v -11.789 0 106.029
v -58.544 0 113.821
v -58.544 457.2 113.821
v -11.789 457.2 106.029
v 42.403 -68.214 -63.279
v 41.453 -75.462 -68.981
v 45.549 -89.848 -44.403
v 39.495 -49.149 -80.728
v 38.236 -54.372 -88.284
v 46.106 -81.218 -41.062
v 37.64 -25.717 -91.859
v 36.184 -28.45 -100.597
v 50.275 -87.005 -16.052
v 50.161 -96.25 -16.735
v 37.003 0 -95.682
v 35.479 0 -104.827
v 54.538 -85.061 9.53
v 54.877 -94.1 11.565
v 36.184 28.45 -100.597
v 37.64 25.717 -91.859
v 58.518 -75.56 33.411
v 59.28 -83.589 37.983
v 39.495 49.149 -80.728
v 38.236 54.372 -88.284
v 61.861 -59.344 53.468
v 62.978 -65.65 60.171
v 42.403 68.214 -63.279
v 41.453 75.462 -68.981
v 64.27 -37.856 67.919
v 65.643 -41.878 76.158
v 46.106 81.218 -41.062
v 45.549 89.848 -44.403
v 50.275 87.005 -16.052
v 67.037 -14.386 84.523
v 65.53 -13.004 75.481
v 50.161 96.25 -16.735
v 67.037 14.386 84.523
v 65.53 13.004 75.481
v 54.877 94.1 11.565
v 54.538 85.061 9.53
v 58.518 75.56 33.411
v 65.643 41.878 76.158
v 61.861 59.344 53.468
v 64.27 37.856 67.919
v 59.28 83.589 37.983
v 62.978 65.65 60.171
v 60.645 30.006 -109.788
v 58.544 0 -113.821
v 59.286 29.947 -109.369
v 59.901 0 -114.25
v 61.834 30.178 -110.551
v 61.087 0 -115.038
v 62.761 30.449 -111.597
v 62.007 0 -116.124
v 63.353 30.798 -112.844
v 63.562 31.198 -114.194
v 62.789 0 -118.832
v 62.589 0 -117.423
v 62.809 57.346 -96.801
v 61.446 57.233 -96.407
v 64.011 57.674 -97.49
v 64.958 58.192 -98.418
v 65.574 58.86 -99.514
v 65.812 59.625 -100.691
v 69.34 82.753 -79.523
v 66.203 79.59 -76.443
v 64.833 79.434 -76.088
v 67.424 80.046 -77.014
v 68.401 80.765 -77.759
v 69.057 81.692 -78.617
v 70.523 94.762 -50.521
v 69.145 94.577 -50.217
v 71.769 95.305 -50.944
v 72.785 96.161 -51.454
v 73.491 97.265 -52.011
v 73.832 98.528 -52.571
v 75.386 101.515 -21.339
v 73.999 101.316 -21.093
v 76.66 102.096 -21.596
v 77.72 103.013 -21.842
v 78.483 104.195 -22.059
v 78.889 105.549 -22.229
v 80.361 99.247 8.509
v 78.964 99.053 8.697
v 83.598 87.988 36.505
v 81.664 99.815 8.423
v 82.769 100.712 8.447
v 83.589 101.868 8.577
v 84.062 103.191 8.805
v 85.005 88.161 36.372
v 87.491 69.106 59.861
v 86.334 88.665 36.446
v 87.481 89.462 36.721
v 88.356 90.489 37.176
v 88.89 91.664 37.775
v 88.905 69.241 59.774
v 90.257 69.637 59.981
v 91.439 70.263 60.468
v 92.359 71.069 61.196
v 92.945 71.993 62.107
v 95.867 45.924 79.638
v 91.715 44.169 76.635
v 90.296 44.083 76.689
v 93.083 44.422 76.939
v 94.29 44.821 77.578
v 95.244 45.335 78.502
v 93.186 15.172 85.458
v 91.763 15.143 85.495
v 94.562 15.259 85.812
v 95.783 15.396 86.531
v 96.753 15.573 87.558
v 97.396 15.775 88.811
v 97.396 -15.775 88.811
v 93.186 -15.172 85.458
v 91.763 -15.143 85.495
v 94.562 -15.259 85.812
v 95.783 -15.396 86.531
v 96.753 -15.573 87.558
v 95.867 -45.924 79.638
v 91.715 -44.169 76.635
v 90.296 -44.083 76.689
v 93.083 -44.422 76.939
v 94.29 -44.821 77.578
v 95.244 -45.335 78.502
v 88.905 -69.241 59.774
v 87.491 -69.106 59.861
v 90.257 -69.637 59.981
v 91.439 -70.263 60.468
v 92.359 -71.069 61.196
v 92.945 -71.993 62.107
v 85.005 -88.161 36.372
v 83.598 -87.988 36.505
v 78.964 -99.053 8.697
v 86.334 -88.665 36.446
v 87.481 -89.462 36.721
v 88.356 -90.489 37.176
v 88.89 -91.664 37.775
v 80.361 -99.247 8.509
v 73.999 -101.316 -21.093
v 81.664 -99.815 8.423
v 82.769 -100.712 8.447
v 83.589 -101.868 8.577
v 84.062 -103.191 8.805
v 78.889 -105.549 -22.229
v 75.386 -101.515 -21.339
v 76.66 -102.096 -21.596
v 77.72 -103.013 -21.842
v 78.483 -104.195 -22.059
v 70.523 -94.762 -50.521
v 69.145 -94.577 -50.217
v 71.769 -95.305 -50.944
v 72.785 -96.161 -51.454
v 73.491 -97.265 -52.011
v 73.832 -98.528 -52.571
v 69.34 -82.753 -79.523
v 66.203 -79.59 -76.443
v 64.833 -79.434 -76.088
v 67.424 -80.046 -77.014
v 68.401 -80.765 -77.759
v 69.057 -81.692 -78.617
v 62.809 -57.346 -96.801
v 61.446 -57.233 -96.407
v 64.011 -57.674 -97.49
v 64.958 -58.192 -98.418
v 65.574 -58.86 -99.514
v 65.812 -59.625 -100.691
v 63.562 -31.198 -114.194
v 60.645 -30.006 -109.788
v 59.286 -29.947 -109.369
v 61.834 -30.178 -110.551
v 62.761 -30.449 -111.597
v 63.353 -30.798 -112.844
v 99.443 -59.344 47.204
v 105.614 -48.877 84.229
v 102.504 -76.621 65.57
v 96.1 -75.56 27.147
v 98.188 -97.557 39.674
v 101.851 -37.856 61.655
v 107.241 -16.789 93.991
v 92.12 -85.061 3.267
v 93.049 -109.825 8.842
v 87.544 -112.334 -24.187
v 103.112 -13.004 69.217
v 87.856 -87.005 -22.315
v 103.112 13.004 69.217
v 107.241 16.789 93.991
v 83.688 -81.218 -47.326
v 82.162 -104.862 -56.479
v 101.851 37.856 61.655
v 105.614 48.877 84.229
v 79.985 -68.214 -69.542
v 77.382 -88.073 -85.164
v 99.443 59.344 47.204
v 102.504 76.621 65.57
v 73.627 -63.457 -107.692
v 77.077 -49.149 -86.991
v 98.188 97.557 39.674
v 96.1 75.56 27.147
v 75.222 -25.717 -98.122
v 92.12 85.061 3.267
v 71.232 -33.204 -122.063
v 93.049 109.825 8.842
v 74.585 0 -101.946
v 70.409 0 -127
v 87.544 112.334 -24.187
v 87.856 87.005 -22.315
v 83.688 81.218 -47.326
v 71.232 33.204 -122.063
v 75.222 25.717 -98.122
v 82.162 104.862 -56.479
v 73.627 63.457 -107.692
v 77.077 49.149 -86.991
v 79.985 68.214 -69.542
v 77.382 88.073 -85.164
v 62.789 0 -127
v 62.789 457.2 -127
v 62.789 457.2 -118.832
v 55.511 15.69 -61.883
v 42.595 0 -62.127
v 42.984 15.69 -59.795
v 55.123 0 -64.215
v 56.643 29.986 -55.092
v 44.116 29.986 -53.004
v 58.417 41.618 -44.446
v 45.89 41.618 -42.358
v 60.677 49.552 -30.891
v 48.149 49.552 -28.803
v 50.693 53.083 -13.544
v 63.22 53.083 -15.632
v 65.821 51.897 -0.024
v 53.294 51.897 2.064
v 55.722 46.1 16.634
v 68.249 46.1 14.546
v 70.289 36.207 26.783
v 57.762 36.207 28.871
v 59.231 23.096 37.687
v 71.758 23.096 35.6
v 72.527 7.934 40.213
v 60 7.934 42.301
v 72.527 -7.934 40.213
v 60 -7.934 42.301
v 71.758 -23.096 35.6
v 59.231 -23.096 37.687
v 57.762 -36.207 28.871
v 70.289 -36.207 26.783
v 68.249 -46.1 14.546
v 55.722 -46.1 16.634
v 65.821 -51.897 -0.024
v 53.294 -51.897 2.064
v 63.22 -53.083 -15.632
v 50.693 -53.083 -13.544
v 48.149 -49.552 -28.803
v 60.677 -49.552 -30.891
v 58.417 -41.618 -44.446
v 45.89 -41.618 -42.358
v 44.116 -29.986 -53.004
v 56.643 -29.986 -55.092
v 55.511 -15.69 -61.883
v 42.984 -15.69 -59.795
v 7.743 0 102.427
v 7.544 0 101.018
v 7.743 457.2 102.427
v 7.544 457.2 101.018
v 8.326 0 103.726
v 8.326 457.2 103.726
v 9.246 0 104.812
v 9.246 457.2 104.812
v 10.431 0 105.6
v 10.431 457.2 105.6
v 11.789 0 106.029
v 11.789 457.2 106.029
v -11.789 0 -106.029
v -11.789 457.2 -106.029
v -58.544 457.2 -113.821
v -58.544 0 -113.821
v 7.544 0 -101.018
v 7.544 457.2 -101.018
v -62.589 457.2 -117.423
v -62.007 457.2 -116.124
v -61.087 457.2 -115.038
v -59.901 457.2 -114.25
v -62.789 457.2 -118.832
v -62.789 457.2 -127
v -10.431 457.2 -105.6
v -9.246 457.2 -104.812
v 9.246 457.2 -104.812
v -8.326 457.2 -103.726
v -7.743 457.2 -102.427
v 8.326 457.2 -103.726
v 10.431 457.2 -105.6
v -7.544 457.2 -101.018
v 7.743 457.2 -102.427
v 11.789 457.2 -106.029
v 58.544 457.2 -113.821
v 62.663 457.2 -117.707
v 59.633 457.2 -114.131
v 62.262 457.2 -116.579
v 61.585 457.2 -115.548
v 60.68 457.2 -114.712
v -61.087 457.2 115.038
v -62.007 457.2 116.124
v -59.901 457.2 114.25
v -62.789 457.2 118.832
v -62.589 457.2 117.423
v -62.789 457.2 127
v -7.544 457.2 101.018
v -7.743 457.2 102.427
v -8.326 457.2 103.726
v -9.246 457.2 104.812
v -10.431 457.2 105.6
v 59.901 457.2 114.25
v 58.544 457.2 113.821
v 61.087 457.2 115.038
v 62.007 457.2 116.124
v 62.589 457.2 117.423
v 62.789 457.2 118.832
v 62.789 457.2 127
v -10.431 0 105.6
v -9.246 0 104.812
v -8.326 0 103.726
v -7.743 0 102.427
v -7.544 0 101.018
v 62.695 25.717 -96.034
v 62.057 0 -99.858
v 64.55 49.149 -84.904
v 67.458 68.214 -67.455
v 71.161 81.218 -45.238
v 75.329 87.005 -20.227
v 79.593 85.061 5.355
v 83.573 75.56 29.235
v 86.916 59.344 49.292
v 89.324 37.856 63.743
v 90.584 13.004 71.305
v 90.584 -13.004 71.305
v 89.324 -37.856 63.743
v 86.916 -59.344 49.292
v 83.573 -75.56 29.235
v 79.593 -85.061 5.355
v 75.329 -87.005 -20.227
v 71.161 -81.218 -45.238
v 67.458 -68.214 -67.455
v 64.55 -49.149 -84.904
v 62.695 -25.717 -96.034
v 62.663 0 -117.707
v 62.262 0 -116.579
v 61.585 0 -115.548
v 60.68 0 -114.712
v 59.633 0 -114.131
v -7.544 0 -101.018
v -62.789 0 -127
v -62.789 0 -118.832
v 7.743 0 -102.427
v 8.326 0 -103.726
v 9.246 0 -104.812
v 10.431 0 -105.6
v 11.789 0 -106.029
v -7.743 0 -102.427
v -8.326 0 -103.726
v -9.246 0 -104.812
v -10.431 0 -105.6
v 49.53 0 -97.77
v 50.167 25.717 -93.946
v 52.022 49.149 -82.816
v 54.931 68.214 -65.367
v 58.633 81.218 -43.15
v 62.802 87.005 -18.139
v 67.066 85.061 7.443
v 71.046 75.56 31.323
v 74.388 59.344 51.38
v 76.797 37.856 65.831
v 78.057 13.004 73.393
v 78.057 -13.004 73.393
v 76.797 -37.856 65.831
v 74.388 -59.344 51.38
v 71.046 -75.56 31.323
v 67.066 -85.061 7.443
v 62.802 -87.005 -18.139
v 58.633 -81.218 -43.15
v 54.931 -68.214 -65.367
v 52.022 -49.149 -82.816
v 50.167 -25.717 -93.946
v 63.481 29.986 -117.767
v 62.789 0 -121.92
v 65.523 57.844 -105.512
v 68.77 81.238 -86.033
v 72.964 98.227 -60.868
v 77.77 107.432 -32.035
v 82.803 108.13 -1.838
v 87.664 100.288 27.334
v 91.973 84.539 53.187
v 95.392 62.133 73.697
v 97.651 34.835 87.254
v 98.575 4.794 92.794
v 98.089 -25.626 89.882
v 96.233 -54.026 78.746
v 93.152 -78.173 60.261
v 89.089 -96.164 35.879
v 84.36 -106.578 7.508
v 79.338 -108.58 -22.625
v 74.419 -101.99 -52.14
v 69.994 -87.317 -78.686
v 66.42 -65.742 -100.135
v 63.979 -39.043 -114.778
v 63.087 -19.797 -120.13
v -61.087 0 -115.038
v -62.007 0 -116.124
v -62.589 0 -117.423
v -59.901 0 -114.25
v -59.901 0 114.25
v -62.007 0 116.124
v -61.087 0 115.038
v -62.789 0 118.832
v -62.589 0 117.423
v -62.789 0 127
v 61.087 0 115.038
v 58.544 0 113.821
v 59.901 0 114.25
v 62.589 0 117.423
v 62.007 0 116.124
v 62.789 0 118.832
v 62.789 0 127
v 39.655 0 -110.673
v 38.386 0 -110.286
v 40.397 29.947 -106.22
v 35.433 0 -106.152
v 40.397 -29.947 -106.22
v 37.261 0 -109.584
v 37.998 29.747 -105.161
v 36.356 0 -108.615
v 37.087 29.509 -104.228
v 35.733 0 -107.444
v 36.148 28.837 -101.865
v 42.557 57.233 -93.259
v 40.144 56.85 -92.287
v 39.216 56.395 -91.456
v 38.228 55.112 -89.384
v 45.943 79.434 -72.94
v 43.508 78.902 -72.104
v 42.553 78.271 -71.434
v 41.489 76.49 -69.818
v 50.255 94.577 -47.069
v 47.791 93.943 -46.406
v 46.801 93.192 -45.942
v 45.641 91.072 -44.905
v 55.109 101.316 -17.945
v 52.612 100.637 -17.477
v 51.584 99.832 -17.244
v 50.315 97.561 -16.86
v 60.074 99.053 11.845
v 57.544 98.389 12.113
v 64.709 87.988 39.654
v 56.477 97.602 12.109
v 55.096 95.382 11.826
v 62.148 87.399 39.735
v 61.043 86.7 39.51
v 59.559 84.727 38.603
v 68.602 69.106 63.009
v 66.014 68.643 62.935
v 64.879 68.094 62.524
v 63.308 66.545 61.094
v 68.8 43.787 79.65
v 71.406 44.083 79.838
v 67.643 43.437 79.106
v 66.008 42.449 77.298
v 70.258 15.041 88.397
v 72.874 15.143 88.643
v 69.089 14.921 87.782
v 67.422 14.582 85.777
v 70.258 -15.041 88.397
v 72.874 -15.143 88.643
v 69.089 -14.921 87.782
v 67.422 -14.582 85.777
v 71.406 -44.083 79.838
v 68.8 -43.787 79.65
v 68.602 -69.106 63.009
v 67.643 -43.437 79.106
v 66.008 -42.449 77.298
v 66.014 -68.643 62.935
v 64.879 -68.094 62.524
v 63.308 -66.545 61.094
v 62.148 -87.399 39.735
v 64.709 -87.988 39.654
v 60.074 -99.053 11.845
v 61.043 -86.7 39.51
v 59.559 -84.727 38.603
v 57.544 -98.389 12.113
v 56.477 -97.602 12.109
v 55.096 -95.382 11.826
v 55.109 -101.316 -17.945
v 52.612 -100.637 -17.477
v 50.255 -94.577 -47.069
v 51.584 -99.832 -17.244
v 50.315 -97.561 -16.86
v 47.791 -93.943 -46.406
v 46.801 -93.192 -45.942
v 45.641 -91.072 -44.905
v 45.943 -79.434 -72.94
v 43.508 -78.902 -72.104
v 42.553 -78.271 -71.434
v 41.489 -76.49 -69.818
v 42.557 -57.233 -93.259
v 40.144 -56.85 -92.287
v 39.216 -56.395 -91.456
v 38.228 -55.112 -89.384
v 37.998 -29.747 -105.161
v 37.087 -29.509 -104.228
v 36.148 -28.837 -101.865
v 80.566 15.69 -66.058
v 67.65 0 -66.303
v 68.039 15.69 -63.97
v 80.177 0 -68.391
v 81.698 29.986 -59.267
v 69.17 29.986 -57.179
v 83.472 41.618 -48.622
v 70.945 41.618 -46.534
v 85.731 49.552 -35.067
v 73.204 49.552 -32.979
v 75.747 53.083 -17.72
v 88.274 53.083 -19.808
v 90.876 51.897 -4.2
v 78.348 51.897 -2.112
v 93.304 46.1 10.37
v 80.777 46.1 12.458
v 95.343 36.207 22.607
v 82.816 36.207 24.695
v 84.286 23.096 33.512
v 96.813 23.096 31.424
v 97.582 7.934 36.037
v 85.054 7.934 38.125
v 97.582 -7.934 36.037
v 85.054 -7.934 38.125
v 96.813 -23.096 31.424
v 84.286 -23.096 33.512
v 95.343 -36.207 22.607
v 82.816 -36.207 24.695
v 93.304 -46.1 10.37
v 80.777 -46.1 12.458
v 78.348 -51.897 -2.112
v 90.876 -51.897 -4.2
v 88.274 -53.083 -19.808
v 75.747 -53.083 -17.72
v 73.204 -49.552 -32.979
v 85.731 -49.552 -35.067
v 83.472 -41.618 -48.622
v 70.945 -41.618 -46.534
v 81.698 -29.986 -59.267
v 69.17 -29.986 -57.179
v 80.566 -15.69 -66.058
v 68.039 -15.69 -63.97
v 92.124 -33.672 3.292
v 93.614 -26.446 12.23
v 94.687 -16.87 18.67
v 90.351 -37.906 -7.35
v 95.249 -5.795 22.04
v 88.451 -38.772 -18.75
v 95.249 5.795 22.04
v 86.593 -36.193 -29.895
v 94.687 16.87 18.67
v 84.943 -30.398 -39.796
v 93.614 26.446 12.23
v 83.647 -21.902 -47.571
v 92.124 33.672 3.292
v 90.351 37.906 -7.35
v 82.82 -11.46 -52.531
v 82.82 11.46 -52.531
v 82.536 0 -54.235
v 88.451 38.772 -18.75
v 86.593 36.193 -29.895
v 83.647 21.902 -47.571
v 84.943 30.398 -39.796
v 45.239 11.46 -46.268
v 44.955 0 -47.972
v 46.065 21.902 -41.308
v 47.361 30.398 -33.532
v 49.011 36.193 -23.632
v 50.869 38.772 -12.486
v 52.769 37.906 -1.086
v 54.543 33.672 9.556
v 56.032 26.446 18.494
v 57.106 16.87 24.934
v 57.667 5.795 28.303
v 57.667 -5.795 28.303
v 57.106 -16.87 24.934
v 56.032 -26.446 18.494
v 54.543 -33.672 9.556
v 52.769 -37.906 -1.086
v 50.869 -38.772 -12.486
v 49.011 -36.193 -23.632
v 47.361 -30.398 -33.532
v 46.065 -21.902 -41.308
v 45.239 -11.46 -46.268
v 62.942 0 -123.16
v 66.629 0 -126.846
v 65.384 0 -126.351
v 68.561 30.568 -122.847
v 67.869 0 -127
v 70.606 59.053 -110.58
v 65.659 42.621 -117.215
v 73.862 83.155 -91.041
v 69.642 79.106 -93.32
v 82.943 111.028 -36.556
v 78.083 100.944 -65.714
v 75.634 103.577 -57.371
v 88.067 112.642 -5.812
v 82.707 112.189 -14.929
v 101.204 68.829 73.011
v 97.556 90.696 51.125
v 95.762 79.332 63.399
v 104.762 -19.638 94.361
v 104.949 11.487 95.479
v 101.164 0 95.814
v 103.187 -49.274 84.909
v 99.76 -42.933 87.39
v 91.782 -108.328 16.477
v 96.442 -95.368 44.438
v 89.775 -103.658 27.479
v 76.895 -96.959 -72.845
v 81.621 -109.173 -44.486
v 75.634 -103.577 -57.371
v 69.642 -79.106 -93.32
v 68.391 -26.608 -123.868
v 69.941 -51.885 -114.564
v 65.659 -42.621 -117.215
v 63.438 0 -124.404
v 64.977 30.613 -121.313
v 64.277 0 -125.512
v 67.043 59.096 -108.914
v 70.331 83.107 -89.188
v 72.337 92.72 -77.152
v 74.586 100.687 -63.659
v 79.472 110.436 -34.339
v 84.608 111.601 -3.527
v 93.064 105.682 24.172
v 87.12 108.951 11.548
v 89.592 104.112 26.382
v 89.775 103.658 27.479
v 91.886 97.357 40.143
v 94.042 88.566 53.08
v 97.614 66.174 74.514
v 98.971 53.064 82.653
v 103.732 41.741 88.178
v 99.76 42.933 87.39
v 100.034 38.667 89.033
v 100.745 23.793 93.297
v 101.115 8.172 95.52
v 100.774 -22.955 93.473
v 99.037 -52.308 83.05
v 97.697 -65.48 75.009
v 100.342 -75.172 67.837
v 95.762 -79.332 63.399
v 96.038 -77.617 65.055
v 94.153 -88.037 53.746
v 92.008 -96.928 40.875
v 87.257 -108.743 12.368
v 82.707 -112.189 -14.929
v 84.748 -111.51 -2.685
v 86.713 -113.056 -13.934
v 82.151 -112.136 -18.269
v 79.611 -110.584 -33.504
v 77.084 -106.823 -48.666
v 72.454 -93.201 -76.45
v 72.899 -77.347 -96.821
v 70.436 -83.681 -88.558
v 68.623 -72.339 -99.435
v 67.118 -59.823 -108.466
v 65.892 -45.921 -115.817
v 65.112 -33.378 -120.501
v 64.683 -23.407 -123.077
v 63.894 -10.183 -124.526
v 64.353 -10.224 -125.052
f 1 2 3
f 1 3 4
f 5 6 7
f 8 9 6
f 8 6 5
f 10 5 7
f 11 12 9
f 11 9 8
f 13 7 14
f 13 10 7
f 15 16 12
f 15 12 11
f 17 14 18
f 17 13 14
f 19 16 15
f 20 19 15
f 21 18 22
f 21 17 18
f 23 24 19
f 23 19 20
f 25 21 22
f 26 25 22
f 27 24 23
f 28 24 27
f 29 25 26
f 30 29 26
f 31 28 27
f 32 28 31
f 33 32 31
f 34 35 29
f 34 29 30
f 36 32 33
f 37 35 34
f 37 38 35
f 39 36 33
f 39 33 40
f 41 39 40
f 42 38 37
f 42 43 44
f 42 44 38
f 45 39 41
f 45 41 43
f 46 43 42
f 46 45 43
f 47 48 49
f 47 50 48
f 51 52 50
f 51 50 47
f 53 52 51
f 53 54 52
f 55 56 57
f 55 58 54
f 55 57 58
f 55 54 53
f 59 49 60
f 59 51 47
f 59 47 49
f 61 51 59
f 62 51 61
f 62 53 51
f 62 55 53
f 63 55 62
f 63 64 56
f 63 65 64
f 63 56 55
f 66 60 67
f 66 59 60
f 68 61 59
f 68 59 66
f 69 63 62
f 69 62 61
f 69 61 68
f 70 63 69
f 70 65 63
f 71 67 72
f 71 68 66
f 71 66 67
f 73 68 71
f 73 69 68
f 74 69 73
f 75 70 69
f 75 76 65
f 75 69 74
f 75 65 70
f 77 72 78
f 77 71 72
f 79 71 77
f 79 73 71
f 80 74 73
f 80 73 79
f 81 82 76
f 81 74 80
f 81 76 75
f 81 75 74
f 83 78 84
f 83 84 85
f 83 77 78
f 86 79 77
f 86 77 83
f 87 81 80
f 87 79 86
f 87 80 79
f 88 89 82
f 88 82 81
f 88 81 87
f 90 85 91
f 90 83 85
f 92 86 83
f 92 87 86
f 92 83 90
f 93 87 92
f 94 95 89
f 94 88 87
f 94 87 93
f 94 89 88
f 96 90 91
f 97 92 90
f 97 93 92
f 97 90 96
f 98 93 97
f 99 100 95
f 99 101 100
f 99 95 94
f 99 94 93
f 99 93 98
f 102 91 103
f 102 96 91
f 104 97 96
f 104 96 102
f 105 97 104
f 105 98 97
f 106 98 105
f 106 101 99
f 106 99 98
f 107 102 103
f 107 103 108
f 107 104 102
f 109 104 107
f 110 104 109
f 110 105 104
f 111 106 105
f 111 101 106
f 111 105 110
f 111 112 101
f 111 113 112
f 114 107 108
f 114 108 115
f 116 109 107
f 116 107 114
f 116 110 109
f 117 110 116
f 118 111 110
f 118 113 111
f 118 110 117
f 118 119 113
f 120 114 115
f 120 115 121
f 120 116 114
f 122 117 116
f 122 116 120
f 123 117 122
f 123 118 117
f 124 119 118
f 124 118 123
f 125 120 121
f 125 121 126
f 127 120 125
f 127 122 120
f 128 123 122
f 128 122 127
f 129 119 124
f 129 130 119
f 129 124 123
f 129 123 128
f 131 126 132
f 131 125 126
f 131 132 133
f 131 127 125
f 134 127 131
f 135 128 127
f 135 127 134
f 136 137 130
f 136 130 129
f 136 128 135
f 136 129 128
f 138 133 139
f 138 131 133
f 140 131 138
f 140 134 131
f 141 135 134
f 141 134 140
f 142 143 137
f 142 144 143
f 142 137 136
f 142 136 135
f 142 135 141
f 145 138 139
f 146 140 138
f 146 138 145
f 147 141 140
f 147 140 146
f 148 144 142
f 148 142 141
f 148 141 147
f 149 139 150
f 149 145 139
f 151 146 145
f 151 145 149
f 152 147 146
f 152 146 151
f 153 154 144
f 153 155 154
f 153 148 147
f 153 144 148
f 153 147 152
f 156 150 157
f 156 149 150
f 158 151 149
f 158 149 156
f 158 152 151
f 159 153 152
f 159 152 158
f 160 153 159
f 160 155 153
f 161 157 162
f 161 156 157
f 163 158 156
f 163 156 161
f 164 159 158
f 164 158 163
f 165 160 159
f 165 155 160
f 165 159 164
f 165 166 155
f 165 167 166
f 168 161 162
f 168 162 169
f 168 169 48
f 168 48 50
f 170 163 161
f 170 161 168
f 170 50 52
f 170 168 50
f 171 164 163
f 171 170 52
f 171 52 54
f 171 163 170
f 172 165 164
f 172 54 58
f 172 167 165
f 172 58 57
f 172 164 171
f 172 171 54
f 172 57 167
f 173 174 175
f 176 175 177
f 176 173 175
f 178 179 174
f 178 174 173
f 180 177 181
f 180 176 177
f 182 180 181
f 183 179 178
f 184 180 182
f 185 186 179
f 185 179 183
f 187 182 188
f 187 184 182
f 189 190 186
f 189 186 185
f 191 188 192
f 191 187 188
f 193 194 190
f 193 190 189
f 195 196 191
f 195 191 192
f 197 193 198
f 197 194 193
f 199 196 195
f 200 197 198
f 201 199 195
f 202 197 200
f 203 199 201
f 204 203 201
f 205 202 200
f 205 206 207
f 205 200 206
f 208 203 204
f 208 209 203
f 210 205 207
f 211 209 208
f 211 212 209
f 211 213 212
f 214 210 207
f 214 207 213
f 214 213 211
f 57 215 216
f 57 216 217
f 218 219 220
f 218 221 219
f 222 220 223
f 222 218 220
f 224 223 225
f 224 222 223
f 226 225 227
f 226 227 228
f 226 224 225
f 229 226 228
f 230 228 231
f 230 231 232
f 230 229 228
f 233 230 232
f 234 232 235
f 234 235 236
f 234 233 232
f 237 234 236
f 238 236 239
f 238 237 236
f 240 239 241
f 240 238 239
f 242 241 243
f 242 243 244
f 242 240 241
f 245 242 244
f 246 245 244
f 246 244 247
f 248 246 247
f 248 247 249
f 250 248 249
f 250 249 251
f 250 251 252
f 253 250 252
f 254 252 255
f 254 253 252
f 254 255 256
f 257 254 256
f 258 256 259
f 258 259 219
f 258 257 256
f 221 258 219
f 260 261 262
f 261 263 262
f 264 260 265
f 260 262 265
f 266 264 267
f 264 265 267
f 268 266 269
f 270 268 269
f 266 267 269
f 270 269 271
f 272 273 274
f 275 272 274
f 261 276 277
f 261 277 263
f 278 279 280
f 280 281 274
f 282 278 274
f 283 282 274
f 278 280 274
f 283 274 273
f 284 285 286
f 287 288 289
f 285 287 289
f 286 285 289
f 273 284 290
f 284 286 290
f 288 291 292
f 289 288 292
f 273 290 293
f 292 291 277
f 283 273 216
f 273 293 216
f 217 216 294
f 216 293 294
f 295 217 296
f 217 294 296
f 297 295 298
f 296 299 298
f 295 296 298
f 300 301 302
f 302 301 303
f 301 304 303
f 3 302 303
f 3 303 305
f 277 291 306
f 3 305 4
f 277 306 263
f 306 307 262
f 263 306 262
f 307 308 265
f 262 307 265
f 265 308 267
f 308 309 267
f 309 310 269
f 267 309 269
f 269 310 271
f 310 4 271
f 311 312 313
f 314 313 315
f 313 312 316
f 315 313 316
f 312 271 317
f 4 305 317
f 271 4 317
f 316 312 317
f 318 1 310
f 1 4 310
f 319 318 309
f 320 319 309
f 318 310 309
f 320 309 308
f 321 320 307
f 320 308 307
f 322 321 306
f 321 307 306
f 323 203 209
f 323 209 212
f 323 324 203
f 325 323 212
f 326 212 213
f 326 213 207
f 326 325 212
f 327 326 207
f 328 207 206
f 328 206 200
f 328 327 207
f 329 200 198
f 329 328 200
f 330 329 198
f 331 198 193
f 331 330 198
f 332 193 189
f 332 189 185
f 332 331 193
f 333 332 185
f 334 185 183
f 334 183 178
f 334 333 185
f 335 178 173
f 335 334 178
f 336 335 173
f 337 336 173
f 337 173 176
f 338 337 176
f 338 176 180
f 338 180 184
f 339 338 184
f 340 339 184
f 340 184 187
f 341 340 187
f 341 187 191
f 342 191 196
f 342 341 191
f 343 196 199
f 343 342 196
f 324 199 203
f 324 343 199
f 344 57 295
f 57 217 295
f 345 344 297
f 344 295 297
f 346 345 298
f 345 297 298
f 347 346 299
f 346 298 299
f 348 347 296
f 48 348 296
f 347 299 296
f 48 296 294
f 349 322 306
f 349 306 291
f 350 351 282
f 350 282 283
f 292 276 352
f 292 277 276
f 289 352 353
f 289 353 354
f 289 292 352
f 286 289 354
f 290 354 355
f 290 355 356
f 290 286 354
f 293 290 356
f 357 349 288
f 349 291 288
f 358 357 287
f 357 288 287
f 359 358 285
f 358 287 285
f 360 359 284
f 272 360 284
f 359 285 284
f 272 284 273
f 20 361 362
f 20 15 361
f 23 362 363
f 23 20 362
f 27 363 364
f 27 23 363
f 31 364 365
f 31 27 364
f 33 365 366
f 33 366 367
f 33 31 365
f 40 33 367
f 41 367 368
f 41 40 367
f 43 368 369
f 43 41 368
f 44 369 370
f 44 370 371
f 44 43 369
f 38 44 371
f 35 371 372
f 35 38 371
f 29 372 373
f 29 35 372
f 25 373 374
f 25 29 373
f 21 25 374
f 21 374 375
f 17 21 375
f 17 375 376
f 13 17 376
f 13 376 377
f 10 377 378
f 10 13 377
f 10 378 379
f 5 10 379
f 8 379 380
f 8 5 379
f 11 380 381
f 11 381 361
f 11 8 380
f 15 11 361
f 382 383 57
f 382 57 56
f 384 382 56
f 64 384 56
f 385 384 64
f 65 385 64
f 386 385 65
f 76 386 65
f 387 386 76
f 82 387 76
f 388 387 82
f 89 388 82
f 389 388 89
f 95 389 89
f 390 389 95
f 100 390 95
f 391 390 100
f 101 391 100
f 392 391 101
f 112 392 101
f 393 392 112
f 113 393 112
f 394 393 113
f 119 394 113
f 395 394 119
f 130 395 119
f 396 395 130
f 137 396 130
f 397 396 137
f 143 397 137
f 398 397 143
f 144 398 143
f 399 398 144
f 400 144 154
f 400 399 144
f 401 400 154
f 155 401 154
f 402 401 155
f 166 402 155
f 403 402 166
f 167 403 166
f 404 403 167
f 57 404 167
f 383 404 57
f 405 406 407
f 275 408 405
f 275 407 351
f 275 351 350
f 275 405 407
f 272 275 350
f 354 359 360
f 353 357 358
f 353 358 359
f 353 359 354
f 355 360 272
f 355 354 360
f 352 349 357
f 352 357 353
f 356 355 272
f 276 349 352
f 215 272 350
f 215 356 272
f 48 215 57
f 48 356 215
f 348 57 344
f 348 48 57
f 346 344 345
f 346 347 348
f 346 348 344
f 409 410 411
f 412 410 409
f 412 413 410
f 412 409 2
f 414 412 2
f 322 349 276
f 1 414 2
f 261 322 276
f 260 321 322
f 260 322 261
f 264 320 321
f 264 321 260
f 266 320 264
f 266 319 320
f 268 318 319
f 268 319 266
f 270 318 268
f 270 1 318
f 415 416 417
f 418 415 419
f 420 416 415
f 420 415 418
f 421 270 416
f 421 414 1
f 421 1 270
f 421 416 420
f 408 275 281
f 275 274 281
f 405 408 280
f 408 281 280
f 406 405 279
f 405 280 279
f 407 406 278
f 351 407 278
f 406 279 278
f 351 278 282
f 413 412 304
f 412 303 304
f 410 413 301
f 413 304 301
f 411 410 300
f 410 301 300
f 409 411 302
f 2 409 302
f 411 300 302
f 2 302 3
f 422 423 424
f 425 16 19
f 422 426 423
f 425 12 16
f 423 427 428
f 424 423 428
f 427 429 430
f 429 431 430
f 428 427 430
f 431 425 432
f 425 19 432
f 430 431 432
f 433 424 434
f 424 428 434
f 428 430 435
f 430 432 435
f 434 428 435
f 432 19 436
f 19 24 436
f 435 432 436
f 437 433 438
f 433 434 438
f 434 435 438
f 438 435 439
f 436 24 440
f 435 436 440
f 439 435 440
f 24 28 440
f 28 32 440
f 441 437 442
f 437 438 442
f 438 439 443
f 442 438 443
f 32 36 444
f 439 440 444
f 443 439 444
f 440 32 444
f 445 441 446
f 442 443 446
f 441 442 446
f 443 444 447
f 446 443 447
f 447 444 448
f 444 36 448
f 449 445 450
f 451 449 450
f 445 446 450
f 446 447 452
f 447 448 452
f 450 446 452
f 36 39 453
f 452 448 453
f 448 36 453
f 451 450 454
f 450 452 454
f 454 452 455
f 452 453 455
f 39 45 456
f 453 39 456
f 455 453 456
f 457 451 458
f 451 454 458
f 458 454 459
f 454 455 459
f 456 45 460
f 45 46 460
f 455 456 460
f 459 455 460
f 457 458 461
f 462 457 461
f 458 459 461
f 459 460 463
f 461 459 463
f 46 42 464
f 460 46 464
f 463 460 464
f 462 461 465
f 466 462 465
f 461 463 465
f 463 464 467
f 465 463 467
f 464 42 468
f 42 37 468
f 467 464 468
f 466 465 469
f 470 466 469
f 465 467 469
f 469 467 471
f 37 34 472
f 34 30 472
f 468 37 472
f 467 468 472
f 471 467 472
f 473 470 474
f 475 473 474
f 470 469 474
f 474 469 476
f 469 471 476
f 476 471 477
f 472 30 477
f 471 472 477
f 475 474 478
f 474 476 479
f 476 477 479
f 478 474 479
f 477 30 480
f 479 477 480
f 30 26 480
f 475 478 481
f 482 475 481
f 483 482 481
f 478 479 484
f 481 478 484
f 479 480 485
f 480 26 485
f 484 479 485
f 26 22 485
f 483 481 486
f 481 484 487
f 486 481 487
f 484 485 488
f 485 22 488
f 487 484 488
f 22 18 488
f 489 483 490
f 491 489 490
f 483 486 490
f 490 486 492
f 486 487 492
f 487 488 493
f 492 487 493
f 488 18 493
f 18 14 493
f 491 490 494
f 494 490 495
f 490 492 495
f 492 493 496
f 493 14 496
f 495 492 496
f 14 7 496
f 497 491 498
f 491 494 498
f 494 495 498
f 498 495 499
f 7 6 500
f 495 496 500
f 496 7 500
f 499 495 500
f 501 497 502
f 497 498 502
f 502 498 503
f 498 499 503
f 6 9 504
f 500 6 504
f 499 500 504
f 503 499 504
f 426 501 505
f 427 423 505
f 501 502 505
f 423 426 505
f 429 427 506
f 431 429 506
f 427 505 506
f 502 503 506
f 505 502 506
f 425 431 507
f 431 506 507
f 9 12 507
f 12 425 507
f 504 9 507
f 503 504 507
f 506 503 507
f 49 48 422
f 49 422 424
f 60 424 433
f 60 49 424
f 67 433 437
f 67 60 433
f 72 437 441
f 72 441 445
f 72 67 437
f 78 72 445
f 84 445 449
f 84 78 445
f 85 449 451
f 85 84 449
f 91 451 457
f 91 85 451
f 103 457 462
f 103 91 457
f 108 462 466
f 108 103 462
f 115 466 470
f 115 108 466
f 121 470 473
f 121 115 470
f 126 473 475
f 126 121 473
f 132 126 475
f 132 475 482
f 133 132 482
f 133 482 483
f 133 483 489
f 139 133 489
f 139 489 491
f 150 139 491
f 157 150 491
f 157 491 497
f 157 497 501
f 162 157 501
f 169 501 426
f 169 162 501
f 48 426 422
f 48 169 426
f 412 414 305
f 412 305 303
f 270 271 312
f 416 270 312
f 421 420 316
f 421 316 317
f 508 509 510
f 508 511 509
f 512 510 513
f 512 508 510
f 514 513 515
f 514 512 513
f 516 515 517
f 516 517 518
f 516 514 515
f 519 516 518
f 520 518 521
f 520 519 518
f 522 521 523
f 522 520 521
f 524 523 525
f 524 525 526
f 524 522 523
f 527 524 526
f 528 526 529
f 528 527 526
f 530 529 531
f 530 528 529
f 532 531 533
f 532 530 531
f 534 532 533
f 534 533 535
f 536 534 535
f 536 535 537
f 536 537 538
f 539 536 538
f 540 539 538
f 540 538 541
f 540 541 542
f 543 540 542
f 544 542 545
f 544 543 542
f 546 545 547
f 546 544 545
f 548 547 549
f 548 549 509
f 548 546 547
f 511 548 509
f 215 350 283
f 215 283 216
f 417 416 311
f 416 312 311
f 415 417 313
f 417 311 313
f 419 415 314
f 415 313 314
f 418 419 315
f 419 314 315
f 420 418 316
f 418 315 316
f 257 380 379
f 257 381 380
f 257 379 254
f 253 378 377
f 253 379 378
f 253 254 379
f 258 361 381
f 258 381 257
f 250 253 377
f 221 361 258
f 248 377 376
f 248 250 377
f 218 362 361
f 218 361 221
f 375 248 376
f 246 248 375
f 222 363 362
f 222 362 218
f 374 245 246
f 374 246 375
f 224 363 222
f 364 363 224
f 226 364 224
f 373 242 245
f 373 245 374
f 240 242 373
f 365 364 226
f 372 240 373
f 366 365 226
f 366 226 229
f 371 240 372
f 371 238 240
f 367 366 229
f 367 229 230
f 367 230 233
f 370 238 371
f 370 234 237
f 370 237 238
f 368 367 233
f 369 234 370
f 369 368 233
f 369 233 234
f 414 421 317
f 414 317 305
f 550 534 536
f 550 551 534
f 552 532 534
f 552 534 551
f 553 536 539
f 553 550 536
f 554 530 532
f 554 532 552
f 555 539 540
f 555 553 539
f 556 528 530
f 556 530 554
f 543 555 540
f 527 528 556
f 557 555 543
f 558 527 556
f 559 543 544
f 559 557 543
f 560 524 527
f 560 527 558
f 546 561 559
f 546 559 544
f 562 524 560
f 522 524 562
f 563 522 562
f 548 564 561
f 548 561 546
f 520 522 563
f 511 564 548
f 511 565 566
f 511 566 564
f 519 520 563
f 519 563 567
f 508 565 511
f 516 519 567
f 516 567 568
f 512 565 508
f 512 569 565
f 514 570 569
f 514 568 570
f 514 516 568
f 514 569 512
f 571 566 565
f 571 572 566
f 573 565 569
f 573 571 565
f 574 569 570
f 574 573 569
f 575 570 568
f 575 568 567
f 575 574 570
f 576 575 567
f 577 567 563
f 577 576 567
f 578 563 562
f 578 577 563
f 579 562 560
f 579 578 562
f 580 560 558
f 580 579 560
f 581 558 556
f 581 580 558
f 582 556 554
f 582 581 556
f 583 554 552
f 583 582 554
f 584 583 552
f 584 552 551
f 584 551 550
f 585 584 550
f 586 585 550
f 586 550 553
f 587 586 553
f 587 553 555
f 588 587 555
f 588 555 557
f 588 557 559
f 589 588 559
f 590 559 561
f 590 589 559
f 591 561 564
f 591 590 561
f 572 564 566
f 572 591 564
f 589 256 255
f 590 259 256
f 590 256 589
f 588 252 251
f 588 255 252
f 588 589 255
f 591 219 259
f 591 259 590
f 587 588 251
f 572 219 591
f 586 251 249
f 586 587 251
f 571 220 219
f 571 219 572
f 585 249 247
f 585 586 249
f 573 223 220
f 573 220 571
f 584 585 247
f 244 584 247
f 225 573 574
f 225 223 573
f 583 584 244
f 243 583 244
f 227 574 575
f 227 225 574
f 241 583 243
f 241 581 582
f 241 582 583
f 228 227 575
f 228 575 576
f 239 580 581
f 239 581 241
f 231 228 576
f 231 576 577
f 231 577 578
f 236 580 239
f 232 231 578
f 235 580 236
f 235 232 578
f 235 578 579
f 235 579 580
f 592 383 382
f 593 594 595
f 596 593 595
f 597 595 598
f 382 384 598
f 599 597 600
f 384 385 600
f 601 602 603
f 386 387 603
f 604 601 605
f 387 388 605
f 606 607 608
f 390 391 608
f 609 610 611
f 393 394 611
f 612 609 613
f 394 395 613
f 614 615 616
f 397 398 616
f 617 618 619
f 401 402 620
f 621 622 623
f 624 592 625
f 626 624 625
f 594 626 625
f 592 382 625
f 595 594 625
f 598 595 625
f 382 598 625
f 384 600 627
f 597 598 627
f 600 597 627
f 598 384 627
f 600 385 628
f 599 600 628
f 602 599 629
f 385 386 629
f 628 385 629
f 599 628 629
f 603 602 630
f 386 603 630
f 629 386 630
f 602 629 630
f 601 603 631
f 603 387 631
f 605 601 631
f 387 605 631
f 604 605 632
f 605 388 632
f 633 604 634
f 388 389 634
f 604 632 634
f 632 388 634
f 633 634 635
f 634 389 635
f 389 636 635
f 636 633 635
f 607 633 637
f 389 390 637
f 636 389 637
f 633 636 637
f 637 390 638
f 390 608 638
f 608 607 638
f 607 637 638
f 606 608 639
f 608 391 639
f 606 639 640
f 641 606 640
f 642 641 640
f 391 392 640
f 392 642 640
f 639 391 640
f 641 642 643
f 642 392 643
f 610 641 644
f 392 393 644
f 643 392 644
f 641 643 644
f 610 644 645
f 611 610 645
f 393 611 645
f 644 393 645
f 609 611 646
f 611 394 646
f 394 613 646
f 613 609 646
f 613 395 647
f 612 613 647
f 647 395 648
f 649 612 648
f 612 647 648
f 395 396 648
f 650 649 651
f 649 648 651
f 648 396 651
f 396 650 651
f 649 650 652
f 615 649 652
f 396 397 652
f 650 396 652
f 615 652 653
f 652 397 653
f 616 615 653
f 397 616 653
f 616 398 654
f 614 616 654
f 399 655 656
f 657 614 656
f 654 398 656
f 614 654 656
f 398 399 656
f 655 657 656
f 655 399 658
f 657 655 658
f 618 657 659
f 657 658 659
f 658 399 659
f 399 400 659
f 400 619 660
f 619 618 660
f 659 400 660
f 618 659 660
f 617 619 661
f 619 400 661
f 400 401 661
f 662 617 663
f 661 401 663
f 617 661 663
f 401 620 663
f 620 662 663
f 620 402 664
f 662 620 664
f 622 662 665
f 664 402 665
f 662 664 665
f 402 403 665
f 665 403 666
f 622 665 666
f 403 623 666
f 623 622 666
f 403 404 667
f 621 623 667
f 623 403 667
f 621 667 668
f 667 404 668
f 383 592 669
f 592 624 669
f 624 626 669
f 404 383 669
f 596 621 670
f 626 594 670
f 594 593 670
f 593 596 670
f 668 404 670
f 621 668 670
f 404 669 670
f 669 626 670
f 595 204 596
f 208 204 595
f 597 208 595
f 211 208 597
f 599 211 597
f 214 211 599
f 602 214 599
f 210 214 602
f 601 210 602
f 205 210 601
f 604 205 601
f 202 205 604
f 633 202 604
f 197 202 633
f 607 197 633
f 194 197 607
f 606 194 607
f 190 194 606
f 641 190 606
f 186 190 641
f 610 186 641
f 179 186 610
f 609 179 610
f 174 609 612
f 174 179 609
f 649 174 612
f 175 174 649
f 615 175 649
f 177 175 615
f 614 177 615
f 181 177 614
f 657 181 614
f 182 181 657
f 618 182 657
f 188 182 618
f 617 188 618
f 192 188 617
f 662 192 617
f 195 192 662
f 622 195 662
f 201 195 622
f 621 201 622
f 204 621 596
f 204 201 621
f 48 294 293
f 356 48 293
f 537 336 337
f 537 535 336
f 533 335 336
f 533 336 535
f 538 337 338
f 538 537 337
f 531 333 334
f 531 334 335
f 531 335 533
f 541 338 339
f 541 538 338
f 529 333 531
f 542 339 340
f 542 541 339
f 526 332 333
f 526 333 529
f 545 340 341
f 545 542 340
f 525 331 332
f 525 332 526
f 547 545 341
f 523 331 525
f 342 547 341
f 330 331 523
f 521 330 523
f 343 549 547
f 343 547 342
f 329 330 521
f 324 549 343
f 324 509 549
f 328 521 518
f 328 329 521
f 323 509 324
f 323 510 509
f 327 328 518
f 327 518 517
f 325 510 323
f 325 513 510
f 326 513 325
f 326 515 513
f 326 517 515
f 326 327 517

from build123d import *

# Parameters (mm, degrees)
F1_DEPTH = 457.2
F2_R     = 5.08
F5_R     = 5.08


with BuildPart() as f1:
    # F0 (on Front) → F1 (new body)
    with BuildSketch(Plane.XZ):
        Polygon((7.5438, -105.3211), (7.5438, 105.3211), (47.5488, 111.9886), (47.5488, 114.5286), (62.7888, 114.5286), (62.7888, 127), (-62.7888, 127), (-62.7888, 114.5286), (-47.5488, 114.5286), (-47.5488, 111.9886), (-7.5438, 105.3211), (-7.5438, -105.3211), (-47.5488, -111.9886), (-47.5488, -114.5286), (-62.7888, -114.5286), (-62.7888, -127), (62.7888, -127), (62.7888, -114.5286), (59.7353338065, -114.0196889677), align=None)
        Polygon((47.5488, 114.5286), (47.5488, 111.9886), (62.7888, 114.5286), align=None)
        Polygon((-47.5488, 114.5286), (-62.7888, 114.5286), (-47.5488, 111.9886), align=None)
        Polygon((-47.5488, -111.9886), (-62.7888, -114.5286), (-47.5488, -114.5286), align=None)
    extrude(amount=-F1_DEPTH)

    # F2
    f2_edges = [f1.edges().sort_by_distance(p)[0] for p in [
        (7.5438, 228.6, -105.3211),
        (-7.5438, 228.6, -105.3211),
        (-7.5438, 228.6, 105.3211),
        (7.5438, 228.6, 105.3211),
        (62.7888, 228.6, -114.5286),
        (-62.7888, 228.6, -114.5286),
        (-62.7888, 228.6, 114.5286),
        (62.7888, 228.6, 114.5286),
    ]]
    fillet(f2_edges, radius=F2_R)


with BuildPart() as f4:
    # F3 (on face) → F4 (revolve)
    with BuildSketch(Plane.XZ):
        with BuildLine():
            Line((34.6436347452, -109.8377391242), (58.5439468555, -113.8211244759))
            ThreePointArc((58.5439468555, -113.8211244759), (61.584941511, -115.5484211366), (62.7888, -118.832005609))
            Line((62.7888, -118.832005609), (62.7888, -127))
            Line((62.7888, -127), (70.4088, -127))
            Line((70.4088, -127), (74.5845342776, -101.9455943347))
            Line((74.5845342776, -101.9455943347), (62.0573320043, -99.8577272891))
            Line((62.0573320043, -99.8577272891), (67.6497483741, -66.3032290705))
            Line((67.6497483741, -66.3032290705), (80.1769506473, -68.391096116))
            Line((80.1769506473, -68.391096116), (82.5362416816, -54.2353499101))
            Line((82.5362416816, -54.2353499101), (44.9546331836, -47.9717484938))
            Line((44.9546331836, -47.9717484938), (42.5953421493, -62.1274946997))
            Line((42.5953421493, -62.1274946997), (55.1225444226, -64.2153617452))
            Line((55.1225444226, -64.2153617452), (49.5301280528, -97.7698599639))
            Line((49.5301280528, -97.7698599639), (37.0029257796, -95.6819929183))
            Line((37.0029257796, -95.6819929183), (34.6436347452, -109.8377391242))
        make_face()
    revolve(axis=Axis((61.995234676, 0, -11.3948935996), (0.9863939238, 0, -0.1643989873)))

    # F5
    f5_edges = [f4.edges().sort_by_distance(p)[0] for p in [
        (68.049509, 0, 90.597506),
        (97.590373, 0, 89.977434),
        (100.239453, 0, 97.703916),
        (62.7888, 0, -122.916003),
    ]]
    fillet(f5_edges, radius=F5_R)


solid = Compound([f1.part, f4.part])
